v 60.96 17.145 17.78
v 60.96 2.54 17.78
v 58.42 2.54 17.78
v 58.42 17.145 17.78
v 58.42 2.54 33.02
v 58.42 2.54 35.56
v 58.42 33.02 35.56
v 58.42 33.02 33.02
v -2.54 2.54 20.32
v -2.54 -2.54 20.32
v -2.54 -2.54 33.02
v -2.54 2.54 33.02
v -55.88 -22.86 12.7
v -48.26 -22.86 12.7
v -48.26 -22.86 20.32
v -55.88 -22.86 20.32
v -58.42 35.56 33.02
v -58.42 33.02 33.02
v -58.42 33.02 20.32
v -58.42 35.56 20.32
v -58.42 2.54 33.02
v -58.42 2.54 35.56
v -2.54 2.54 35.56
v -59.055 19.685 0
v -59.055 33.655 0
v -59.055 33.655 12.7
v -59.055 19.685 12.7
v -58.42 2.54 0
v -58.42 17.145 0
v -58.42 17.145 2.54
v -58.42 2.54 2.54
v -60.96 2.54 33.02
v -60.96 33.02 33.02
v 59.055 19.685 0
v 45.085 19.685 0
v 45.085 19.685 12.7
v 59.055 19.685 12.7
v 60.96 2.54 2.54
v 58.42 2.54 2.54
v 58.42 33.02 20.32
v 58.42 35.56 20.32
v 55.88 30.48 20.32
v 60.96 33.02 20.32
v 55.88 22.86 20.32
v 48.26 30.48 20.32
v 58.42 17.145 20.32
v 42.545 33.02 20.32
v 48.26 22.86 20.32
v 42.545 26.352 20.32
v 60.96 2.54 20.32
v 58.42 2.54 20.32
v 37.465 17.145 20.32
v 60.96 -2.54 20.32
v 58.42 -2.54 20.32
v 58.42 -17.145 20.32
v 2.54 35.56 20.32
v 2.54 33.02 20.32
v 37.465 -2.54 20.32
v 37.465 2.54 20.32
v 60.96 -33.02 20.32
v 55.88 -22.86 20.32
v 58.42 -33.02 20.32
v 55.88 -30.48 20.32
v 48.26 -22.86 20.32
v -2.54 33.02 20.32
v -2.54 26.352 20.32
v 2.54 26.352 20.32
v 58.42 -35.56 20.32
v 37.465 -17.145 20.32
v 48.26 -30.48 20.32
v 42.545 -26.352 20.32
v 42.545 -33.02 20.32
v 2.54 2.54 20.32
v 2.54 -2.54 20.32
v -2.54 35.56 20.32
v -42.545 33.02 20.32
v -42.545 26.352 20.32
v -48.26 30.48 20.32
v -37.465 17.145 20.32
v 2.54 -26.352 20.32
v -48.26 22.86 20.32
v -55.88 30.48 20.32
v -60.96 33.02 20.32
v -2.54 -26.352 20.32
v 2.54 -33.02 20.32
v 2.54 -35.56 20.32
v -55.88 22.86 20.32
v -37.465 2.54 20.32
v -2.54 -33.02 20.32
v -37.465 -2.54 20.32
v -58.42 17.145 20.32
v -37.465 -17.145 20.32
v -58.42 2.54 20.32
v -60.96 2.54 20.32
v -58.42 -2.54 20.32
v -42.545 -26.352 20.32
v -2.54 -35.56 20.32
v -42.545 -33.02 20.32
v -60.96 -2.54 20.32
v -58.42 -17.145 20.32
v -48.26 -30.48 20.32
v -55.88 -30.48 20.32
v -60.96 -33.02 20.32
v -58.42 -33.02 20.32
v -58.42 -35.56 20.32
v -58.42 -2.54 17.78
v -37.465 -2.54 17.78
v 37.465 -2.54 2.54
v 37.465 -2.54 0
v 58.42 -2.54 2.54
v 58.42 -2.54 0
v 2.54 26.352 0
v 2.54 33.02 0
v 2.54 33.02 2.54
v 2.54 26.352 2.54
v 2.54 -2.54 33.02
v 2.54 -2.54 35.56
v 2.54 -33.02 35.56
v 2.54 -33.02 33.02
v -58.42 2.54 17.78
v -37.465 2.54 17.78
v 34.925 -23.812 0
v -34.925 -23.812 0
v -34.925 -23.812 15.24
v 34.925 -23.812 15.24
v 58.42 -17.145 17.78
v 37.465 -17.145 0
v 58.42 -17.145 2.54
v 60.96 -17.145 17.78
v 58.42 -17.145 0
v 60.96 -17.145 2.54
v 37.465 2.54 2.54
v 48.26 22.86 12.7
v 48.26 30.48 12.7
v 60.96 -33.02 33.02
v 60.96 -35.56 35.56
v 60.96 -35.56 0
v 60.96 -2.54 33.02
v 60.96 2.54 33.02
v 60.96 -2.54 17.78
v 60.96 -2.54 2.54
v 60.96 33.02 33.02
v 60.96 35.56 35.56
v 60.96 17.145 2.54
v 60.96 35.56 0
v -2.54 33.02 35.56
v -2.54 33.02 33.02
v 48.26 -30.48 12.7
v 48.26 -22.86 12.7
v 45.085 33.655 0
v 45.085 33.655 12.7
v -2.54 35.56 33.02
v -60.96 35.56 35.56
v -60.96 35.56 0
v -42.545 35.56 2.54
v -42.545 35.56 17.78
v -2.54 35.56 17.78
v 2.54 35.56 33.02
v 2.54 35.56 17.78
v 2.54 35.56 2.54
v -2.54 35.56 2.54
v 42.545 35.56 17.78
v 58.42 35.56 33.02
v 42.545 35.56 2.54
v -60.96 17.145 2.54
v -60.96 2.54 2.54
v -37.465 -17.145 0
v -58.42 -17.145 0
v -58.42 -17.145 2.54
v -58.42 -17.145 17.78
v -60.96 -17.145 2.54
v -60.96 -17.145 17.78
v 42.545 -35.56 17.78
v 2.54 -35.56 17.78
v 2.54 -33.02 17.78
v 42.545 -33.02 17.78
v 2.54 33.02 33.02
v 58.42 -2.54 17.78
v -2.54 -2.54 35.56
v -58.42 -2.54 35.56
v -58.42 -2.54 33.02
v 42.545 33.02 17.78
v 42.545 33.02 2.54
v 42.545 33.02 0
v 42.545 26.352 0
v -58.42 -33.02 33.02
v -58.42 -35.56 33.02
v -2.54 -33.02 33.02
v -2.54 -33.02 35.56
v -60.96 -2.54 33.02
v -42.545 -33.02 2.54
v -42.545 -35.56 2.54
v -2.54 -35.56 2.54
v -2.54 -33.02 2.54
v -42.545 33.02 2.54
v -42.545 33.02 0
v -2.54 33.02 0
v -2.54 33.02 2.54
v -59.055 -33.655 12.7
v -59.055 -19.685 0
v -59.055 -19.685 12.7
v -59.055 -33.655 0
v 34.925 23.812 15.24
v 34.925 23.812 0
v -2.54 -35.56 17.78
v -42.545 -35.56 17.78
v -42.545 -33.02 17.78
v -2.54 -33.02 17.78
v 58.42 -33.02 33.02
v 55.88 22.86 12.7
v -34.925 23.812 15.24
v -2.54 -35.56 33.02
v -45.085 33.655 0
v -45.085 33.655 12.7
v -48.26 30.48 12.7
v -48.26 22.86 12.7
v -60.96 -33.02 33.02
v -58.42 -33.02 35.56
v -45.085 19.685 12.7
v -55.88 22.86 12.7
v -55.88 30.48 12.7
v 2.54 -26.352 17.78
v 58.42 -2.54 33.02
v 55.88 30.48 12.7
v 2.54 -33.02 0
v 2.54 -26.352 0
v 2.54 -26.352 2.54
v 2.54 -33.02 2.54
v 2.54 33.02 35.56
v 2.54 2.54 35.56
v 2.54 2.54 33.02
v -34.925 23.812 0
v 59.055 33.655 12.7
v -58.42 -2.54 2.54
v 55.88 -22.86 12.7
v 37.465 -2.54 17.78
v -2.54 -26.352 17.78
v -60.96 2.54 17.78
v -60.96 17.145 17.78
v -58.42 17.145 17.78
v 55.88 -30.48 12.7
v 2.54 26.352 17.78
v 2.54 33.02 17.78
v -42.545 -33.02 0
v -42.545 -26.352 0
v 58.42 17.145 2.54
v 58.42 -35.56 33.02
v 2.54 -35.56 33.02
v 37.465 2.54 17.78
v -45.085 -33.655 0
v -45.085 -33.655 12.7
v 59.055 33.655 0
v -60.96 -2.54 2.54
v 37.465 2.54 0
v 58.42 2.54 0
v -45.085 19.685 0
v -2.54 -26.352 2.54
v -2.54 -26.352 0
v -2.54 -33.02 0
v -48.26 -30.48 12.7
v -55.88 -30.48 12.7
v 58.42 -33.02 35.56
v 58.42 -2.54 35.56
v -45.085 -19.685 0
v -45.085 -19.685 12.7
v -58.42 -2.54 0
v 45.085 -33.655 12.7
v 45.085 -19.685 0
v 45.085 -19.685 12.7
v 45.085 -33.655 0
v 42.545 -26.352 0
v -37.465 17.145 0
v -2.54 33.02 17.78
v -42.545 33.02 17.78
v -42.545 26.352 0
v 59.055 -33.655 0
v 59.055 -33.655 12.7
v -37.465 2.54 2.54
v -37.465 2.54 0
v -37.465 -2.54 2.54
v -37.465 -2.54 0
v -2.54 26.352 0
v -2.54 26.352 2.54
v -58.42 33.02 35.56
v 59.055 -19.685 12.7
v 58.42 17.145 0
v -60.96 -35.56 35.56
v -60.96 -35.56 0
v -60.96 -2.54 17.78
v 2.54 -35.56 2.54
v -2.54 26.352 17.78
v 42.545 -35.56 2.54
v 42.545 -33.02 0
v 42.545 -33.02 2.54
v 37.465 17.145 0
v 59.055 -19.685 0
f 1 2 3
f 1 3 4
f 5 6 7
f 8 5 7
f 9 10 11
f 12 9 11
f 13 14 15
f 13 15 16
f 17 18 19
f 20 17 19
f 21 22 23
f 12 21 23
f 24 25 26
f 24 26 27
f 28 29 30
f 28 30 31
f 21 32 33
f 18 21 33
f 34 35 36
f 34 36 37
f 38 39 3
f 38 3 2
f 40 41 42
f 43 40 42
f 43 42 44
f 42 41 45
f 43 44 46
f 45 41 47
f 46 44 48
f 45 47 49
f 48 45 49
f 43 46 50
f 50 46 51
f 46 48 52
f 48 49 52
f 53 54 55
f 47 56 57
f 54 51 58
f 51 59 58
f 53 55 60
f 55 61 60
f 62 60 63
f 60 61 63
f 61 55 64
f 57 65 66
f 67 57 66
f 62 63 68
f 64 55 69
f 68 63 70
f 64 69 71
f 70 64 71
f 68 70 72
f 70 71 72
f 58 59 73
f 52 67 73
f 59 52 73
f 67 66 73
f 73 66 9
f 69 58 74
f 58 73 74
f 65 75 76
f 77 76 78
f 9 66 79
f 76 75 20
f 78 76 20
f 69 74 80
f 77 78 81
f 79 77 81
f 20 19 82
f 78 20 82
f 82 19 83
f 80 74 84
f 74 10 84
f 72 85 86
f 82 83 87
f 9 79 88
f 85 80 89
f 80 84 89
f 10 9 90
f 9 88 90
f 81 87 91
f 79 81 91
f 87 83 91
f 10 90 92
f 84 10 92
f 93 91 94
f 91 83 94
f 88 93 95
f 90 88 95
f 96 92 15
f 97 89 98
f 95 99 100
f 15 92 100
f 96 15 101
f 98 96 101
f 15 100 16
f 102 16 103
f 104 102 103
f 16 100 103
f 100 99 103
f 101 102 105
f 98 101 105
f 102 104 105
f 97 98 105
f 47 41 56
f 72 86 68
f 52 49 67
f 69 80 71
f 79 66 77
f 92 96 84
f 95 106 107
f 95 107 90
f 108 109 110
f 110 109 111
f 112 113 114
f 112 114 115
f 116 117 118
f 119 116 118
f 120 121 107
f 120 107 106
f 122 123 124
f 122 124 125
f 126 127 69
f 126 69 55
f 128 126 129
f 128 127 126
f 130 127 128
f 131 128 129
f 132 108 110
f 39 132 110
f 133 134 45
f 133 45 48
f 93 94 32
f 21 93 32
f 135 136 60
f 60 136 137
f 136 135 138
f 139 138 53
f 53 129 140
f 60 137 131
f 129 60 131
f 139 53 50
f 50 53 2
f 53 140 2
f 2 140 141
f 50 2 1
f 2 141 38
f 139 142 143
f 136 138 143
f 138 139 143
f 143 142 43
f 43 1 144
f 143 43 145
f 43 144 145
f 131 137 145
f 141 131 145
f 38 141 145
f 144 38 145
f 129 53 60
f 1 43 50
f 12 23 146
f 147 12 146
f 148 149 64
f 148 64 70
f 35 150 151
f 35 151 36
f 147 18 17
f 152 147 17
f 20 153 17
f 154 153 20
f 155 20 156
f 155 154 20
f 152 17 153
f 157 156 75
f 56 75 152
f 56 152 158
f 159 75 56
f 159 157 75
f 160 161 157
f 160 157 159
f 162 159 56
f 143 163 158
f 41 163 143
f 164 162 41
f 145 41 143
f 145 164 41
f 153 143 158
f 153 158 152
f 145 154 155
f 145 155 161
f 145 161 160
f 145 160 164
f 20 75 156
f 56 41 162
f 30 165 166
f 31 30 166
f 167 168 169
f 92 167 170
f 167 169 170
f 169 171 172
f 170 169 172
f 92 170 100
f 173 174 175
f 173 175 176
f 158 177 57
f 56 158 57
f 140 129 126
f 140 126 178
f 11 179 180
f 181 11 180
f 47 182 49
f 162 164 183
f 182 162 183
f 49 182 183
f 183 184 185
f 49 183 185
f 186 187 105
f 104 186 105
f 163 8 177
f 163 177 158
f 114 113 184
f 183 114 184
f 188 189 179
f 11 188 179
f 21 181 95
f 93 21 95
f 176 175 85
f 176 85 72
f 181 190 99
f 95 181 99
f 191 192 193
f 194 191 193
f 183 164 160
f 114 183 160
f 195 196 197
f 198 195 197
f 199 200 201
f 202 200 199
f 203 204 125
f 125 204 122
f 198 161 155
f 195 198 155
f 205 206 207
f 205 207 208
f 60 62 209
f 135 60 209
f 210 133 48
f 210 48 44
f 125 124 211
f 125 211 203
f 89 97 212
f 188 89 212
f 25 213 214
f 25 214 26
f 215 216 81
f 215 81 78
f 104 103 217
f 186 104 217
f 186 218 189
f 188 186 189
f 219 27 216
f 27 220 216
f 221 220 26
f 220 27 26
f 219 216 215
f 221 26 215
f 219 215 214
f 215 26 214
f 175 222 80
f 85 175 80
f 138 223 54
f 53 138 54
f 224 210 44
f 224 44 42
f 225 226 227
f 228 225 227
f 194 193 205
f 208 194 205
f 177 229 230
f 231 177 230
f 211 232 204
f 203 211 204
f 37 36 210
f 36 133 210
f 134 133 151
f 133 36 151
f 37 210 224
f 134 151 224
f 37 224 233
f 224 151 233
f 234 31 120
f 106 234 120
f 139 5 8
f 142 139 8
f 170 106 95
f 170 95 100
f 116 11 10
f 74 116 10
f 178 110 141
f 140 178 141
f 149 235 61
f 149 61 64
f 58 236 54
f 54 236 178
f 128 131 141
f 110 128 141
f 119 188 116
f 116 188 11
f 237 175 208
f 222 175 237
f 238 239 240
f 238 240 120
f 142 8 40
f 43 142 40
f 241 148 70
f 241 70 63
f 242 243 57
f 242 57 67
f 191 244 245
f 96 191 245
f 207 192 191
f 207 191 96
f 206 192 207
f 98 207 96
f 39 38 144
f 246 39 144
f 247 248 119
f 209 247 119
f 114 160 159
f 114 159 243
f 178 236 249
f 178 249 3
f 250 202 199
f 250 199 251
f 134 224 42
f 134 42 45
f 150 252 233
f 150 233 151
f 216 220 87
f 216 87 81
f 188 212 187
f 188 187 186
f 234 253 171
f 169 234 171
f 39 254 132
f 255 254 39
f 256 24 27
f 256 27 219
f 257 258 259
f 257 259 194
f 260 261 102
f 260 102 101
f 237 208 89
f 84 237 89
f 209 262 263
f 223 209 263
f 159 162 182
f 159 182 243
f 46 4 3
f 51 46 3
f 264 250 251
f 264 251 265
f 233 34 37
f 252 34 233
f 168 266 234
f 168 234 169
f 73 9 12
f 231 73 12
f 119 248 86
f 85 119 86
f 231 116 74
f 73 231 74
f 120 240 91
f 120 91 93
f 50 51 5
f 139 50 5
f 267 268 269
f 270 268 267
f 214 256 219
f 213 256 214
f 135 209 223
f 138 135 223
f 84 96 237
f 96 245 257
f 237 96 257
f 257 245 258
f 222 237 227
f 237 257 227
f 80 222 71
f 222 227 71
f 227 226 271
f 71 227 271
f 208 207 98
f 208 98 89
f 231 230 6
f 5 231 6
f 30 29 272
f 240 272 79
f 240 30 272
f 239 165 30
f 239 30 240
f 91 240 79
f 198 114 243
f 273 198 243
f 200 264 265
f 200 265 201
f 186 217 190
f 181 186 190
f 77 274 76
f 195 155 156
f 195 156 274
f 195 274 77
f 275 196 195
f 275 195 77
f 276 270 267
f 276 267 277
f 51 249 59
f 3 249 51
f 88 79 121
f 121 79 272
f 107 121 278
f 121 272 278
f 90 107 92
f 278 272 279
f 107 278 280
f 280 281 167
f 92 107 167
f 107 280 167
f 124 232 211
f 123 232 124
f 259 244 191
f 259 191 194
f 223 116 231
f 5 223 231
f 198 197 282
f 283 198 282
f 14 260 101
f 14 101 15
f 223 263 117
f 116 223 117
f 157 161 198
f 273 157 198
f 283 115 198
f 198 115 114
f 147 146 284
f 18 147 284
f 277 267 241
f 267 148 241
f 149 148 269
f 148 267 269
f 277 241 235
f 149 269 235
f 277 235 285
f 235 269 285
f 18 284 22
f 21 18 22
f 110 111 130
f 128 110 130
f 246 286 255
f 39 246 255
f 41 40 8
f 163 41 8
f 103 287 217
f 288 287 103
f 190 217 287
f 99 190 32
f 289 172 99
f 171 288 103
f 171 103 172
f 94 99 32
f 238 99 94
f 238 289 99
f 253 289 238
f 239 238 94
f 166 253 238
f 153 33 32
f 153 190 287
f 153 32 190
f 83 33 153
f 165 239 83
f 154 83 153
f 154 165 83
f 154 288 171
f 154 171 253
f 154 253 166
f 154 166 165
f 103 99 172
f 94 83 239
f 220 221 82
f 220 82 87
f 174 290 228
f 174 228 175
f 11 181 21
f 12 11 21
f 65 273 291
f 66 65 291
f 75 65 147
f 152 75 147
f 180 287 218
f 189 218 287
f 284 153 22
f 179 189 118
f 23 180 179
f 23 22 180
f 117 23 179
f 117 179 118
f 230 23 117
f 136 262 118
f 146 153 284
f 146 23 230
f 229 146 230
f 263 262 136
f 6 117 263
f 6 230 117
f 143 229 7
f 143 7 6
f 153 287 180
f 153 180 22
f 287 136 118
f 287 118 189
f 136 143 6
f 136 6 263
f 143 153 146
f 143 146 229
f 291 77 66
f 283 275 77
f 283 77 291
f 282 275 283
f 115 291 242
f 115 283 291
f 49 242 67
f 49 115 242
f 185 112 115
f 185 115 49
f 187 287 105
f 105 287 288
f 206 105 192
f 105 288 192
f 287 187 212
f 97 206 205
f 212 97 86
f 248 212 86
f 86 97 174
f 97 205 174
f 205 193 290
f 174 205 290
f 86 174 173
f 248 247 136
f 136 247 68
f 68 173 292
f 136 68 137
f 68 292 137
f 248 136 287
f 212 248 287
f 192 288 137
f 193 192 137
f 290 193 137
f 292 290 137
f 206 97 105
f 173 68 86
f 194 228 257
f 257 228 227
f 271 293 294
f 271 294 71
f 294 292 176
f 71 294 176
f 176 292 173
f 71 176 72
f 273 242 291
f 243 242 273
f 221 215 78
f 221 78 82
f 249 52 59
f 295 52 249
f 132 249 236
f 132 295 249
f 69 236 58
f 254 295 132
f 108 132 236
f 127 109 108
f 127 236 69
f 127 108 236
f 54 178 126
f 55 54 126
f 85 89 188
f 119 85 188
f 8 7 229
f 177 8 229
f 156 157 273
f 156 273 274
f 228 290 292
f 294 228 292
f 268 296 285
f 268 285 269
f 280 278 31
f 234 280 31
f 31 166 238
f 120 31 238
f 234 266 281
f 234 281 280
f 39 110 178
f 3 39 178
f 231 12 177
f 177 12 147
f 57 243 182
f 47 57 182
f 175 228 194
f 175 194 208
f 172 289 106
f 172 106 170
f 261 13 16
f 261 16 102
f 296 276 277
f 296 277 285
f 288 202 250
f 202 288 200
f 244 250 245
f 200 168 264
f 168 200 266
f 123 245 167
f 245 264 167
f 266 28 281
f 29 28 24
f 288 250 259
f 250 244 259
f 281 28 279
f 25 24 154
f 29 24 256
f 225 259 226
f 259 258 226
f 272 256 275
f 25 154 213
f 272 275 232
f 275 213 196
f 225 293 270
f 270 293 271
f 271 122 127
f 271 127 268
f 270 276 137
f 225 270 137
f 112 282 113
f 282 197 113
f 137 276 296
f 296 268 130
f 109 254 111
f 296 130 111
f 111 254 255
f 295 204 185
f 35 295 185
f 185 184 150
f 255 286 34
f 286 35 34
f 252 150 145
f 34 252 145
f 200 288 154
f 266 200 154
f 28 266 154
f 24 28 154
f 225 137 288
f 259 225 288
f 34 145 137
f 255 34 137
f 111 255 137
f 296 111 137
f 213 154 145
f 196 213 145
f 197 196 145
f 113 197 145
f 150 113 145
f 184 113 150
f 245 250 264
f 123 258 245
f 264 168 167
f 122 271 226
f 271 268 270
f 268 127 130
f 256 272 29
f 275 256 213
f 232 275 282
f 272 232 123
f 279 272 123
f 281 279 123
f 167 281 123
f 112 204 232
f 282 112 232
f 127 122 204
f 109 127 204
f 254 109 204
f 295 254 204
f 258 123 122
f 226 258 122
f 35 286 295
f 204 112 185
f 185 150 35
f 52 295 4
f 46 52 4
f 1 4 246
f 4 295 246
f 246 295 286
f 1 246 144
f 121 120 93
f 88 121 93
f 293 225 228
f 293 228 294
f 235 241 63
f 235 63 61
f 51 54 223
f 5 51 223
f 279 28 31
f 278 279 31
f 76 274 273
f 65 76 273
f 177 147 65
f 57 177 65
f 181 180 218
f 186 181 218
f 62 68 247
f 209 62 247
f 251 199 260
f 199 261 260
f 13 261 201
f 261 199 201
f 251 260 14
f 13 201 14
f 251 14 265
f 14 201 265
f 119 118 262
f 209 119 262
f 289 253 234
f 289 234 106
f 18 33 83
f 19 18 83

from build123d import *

# Parameters (mm, degrees)
F0_W      = 121.92
F0_H      = 71.12
F1_DEPTH  = 35.56
F2_W      = 3.81
F2_H      = 3.81
F3_DEPTH  = 12.7
F4_W      = 69.85
F4_H      = 47.625
F5_DEPTH  = 15.24
F6_W      = 27.94
F6_H      = 6.35
F7_DEPTH  = 71.12
F8_W      = 15.24
F8_H      = 6.35
F9_DEPTH  = 121.92
F10_W     = 27.94
F10_H     = 15.24
F11_DEPTH = 15.24
F12_DEPTH = 35.561
F13_W     = 40.005
F13_H     = 6.6675
F14_DEPTH = 35.561
F15_W     = 40.005
F15_H     = 15.24
F16_DEPTH = 4.2690588161
F17_W     = 40.005
F17_H     = 15.24
F18_DEPTH = 4.0254006162
F19_W     = 20.955
F19_H     = 14.605
F20_DEPTH = 25.4
F21_W     = 14.605
F21_H     = 15.24
F22_DEPTH = 17.6893454045
F23_W     = 14.605
F23_H     = 15.24
F24_DEPTH = 16.1260850728
F25_W     = 20.955
F25_H     = 15.24
F26_DEPTH = 12.7
F27_W     = 6.6675
F27_H     = 15.24
F28_DEPTH = 25.4
F29_W     = 6.6675
F29_H     = 15.24
F30_DEPTH = 25.4
F31_W     = 20.955
F31_H     = 15.24
F32_DEPTH = 12.7


with BuildPart() as f1:
    # F0 (on Top) → F1 (new body)
    with BuildSketch(Plane.XY):
        Rectangle(F0_W, F0_H)
    extrude(amount=F1_DEPTH)

    # F2 (on Top) → F3 (cut)
    with BuildSketch(Plane.XY):
        Polygon((59.055, -19.685), (52.07, -19.685), (52.07, -22.86), (55.88, -22.86), (55.88, -30.48), (48.26, -30.48), (48.26, -26.67), (45.085, -26.67), (45.085, -33.655), (59.055, -33.655), align=None)
        Polygon((52.07, -22.86), (52.07, -19.685), (45.085, -19.685), (45.085, -26.67), (48.26, -26.67), (48.26, -22.86), align=None)
        with Locations((50.165, -24.765)):
            Rectangle(F2_W, F2_H)
        Polygon((55.88, -22.86), (52.07, -22.86), (52.07, -26.67), (48.26, -26.67), (48.26, -30.48), (55.88, -30.48), align=None)
        Polygon((45.085, 33.655), (45.085, 26.67), (48.26, 26.67), (48.26, 30.48), (55.88, 30.48), (55.88, 22.86), (52.07, 22.86), (52.07, 19.685), (59.055, 19.685), (59.055, 33.655), align=None)
        Polygon((48.26, 26.67), (45.085, 26.67), (45.085, 19.685), (52.07, 19.685), (52.07, 22.86), (48.26, 22.86), align=None)
        Polygon((48.26, 30.48), (48.26, 26.67), (52.07, 26.67), (52.07, 22.86), (55.88, 22.86), (55.88, 30.48), align=None)
        with Locations((50.165, 24.765)):
            Rectangle(F2_W, F2_H)
        Polygon((-45.085, 26.67), (-48.26, 26.67), (-48.26, 22.86), (-52.07, 22.86), (-52.07, 19.685), (-45.085, 19.685), align=None)
        Polygon((-52.07, 22.86), (-52.07, 26.67), (-48.26, 26.67), (-48.26, 30.48), (-55.88, 30.48), (-55.88, 22.86), align=None)
        Polygon((-48.26, 30.48), (-48.26, 26.67), (-45.085, 26.67), (-45.085, 33.655), (-59.055, 33.655), (-59.055, 19.685), (-52.07, 19.685), (-52.07, 22.86), (-55.88, 22.86), (-55.88, 30.48), align=None)
        with Locations((-50.165, 24.765)):
            Rectangle(F2_W, F2_H)
        Polygon((-52.07, -22.86), (-52.07, -19.685), (-59.055, -19.685), (-59.055, -33.655), (-45.085, -33.655), (-45.085, -26.67), (-48.26, -26.67), (-48.26, -30.48), (-55.88, -30.48), (-55.88, -22.86), align=None)
        Polygon((-52.07, -26.67), (-52.07, -22.86), (-55.88, -22.86), (-55.88, -30.48), (-48.26, -30.48), (-48.26, -26.67), align=None)
        with Locations((-50.165, -24.765)):
            Rectangle(F2_W, F2_H)
        Polygon((-45.085, -19.685), (-52.07, -19.685), (-52.07, -22.86), (-48.26, -22.86), (-48.26, -26.67), (-45.085, -26.67), align=None)
    extrude(amount=F3_DEPTH, mode=Mode.SUBTRACT)

    # F4 (on face) → F5 (cut)
    with BuildSketch(Plane(origin=(0, 0, 0), x_dir=(1, 0, 0), z_dir=(0, 0, -1))):
        Rectangle(F4_W, F4_H)
    extrude(amount=-F5_DEPTH, mode=Mode.SUBTRACT)

    # F6 (on face) → F7 (cut, through all)
    with BuildSketch(Plane.XZ.offset(35.56)):
        with Locations((-44.45, 29.845)):
            Rectangle(F6_W, F6_H)
        with Locations((-16.51, 29.845)):
            Rectangle(F6_W, F6_H)
        with Locations((-16.51, 23.495)):
            Rectangle(F6_W, F6_H)
        with Locations((-44.45, 23.495)):
            Rectangle(F6_W, F6_H)
        with Locations((16.51, 29.845)):
            Rectangle(F6_W, F6_H)
        with Locations((16.51, 23.495)):
            Rectangle(F6_W, F6_H)
        with Locations((44.45, 29.845)):
            Rectangle(F6_W, F6_H)
        with Locations((44.45, 23.495)):
            Rectangle(F6_W, F6_H)
    extrude(amount=-F7_DEPTH, mode=Mode.SUBTRACT)

    # F8 (on face) → F9 (cut, through all)
    with BuildSketch(Plane(origin=(-60.96, 0, 0), x_dir=(0, -1, 0), z_dir=(-1, 0, 0))):
        with Locations((-25.4, 29.845)):
            Rectangle(F8_W, F8_H)
        with Locations((-10.16, 29.845)):
            Rectangle(F8_W, F8_H)
        with Locations((-10.16, 23.495)):
            Rectangle(F8_W, F8_H)
        with Locations((-25.4, 23.495)):
            Rectangle(F8_W, F8_H)
        with Locations((10.16, 23.495)):
            Rectangle(F8_W, F8_H)
        with Locations((10.16, 29.845)):
            Rectangle(F8_W, F8_H)
        with Locations((25.4, 29.845)):
            Rectangle(F8_W, F8_H)
        with Locations((25.4, 23.495)):
            Rectangle(F8_W, F8_H)
    extrude(amount=-F9_DEPTH, mode=Mode.SUBTRACT)

    # F10 (on face) → F11 (cut, through all)
    with BuildSketch(Plane.XY.offset(35.56)):
        with Locations((-44.45, 25.4)):
            Rectangle(F10_W, F10_H)
        with Locations((-16.51, 25.4)):
            Rectangle(F10_W, F10_H)
        with Locations((-16.51, 10.16)):
            Rectangle(F10_W, F10_H)
        with Locations((-44.45, 10.16)):
            Rectangle(F10_W, F10_H)
        with Locations((16.51, 25.4)):
            Rectangle(F10_W, F10_H)
        with Locations((16.51, 10.16)):
            Rectangle(F10_W, F10_H)
        with Locations((44.45, 25.4)):
            Rectangle(F10_W, F10_H)
        with Locations((44.45, 10.16)):
            Rectangle(F10_W, F10_H)
        with Locations((-44.45, -10.16)):
            Rectangle(F10_W, F10_H)
        with Locations((-16.51, -10.16)):
            Rectangle(F10_W, F10_H)
        with Locations((-16.51, -25.4)):
            Rectangle(F10_W, F10_H)
        with Locations((-44.45, -25.4)):
            Rectangle(F10_W, F10_H)
        with Locations((16.51, -25.4)):
            Rectangle(F10_W, F10_H)
        with Locations((16.51, -10.16)):
            Rectangle(F10_W, F10_H)
        with Locations((44.45, -25.4)):
            Rectangle(F10_W, F10_H)
        with Locations((44.45, -10.16)):
            Rectangle(F10_W, F10_H)
    extrude(amount=-F11_DEPTH, mode=Mode.SUBTRACT)

    # F2 (on Top) → F12 (cut, through all)
    with BuildSketch(Plane.XY):
        with Locations((50.165, -24.765)):
            Rectangle(F2_W, F2_H)
        Polygon((55.88, -22.86), (52.07, -22.86), (52.07, -26.67), (48.26, -26.67), (48.26, -30.48), (55.88, -30.48), align=None)
        with Locations((50.165, 24.765)):
            Rectangle(F2_W, F2_H)
        Polygon((48.26, 30.48), (48.26, 26.67), (52.07, 26.67), (52.07, 22.86), (55.88, 22.86), (55.88, 30.48), align=None)
        Polygon((-52.07, 22.86), (-52.07, 26.67), (-48.26, 26.67), (-48.26, 30.48), (-55.88, 30.48), (-55.88, 22.86), align=None)
        with Locations((-50.165, 24.765)):
            Rectangle(F2_W, F2_H)
        Polygon((-52.07, -26.67), (-52.07, -22.86), (-55.88, -22.86), (-55.88, -30.48), (-48.26, -30.48), (-48.26, -26.67), align=None)
        with Locations((-50.165, -24.765)):
            Rectangle(F2_W, F2_H)
    extrude(amount=F12_DEPTH, mode=Mode.SUBTRACT)

    # F13 (on face) → F14 (cut, through all)
    with BuildSketch(Plane(origin=(0, 0, 0), x_dir=(1, 0, 0), z_dir=(0, 0, -1))):
        with Locations((22.5425, 29.68625)):
            Rectangle(F13_W, F13_H)
        with Locations((-22.5425, 29.68625)):
            Rectangle(F13_W, F13_H)
        with Locations((22.5425, -29.68625)):
            Rectangle(F13_W, F13_H)
        with Locations((-22.5425, -29.68625)):
            Rectangle(F13_W, F13_H)
    extrude(amount=-F14_DEPTH, mode=Mode.SUBTRACT)

    # F15 (on face) → F16 (cut)
    with BuildSketch(Plane.XZ.offset(35.56)):
        with Locations((22.5425, 10.16)):
            Rectangle(F15_W, F15_H)
        with Locations((-22.5425, 10.16)):
            Rectangle(F15_W, F15_H)
    extrude(amount=-F16_DEPTH, mode=Mode.SUBTRACT)

    # F17 (on face) → F18 (cut)
    with BuildSketch(Plane(origin=(0, 35.56, 0), x_dir=(-1, 0, 0), z_dir=(0, 1, 0))):
        with Locations((22.5425, 10.16)):
            Rectangle(F17_W, F17_H)
        with Locations((-22.5425, 10.16)):
            Rectangle(F17_W, F17_H)
    extrude(amount=-F18_DEPTH, mode=Mode.SUBTRACT)

    # F19 (on face) → F20 (cut)
    with BuildSketch(Plane(origin=(0, 0, 0), x_dir=(1, 0, 0), z_dir=(0, 0, -1))):
        with Locations((47.9425, 9.8425)):
            Rectangle(F19_W, F19_H)
        with Locations((-47.9425, -9.8425)):
            Rectangle(F19_W, F19_H)
        with Locations((47.9425, -9.8425)):
            Rectangle(F19_W, F19_H)
        with Locations((-47.9425, 9.8425)):
            Rectangle(F19_W, F19_H)
    extrude(amount=-F20_DEPTH, mode=Mode.SUBTRACT)

    # F21 (on face) → F22 (cut)
    with BuildSketch(Plane.YZ.offset(60.96)):
        with Locations((9.8425, 10.16)):
            Rectangle(F21_W, F21_H)
        with Locations((-9.8425, 10.16)):
            Rectangle(F21_W, F21_H)
    extrude(amount=-F22_DEPTH, mode=Mode.SUBTRACT)

    # F23 (on face) → F24 (cut)
    with BuildSketch(Plane(origin=(-60.96, 0, 0), x_dir=(0, -1, 0), z_dir=(-1, 0, 0))):
        with Locations((-9.8425, 10.16)):
            Rectangle(F23_W, F23_H)
        with Locations((9.8425, 10.16)):
            Rectangle(F23_W, F23_H)
    extrude(amount=-F24_DEPTH, mode=Mode.SUBTRACT)

    # F25 (on face) → F26 (cut)
    with BuildSketch(Plane.XZ.offset(2.54)):
        with Locations((47.9425, 10.16)):
            Rectangle(F25_W, F25_H)
    extrude(amount=-F26_DEPTH, mode=Mode.SUBTRACT)

    # F27 (on face) → F28 (cut)
    with BuildSketch(Plane.YZ.offset(2.54)):
        with Locations((-29.68625, 10.16)):
            Rectangle(F27_W, F27_H)
    extrude(amount=-F28_DEPTH, mode=Mode.SUBTRACT)

    # F29 (on face) → F30 (cut)
    with BuildSketch(Plane.YZ.offset(2.54)):
        with Locations((29.68625, 10.16)):
            Rectangle(F29_W, F29_H)
    extrude(amount=-F30_DEPTH, mode=Mode.SUBTRACT)

    # F31 (on face) → F32 (cut)
    with BuildSketch(Plane(origin=(0, 2.54, 0), x_dir=(-1, 0, 0), z_dir=(0, 1, 0))):
        with Locations((47.9425, 10.16)):
            Rectangle(F31_W, F31_H)
    extrude(amount=-F32_DEPTH, mode=Mode.SUBTRACT)


solid = f1.part
